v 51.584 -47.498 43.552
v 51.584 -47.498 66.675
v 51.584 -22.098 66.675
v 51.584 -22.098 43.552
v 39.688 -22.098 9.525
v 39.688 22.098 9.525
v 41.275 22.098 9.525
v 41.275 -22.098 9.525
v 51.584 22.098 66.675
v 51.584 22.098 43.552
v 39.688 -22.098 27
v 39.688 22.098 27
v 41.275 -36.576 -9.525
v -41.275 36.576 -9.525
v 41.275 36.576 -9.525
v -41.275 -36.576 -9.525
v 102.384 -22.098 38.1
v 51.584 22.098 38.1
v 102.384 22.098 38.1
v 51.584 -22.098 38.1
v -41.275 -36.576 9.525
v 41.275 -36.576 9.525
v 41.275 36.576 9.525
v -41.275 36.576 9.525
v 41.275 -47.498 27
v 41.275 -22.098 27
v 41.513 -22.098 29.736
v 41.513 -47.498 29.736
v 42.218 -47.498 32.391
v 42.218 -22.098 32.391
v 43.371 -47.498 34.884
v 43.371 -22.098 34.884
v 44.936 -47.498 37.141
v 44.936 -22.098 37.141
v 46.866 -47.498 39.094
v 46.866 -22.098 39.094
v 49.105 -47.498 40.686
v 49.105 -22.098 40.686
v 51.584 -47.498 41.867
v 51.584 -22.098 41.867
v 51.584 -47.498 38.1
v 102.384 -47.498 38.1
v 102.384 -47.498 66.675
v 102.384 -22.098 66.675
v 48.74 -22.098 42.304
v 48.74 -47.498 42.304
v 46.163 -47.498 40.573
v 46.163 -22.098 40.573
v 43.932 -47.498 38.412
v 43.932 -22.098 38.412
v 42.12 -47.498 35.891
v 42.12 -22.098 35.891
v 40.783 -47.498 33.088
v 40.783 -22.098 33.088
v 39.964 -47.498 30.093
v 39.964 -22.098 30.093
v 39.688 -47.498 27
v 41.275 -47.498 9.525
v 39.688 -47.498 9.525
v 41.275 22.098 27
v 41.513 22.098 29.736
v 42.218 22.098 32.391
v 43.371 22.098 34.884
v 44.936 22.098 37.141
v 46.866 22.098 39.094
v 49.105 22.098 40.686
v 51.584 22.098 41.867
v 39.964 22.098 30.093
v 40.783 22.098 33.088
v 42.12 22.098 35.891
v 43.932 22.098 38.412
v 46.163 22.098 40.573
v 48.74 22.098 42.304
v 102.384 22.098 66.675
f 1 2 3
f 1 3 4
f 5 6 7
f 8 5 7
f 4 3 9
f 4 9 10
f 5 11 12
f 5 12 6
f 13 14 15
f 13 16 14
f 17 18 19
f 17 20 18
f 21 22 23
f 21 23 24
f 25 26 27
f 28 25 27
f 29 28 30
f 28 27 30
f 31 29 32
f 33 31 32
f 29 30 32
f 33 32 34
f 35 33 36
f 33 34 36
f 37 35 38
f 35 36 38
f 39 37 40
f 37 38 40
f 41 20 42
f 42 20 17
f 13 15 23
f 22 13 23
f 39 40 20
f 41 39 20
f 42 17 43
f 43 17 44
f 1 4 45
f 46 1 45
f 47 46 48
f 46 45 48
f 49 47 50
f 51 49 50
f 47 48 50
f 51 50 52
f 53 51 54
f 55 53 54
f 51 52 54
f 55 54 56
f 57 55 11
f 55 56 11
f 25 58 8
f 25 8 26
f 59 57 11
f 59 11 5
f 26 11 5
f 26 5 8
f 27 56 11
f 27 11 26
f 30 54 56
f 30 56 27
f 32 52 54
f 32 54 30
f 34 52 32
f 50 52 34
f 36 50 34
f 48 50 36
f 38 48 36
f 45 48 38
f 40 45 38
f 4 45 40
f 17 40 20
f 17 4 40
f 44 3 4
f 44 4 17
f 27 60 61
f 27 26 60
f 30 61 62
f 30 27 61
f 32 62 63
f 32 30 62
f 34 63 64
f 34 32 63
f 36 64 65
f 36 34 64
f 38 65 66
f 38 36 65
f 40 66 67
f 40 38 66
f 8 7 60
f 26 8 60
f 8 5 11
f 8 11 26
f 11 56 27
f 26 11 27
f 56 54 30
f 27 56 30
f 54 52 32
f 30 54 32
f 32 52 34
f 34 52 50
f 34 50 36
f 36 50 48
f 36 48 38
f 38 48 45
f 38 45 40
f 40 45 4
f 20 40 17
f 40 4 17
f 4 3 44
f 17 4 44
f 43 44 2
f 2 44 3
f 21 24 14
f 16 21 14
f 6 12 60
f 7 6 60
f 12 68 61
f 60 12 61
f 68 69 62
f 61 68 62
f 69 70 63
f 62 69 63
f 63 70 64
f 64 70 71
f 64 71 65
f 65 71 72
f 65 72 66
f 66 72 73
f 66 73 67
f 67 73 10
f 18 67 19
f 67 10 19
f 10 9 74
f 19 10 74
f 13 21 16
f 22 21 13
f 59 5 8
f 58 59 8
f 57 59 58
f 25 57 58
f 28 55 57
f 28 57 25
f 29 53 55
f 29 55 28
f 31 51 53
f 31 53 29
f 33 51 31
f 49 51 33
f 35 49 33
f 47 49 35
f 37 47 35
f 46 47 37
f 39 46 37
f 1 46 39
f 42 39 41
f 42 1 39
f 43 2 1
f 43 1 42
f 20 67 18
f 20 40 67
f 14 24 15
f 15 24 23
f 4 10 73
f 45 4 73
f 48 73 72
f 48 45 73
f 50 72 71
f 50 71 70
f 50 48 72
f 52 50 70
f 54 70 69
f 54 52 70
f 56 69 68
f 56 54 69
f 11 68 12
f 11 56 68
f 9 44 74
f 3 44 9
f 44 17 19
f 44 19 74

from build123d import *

# Parameters (mm, degrees)
F1_DEPTH = 36.576
F2_DEPTH = 22.098
F3_DEPTH = 25.4


with BuildPart() as f1:
    # F0 (on Front) → F1 (new body, symmetric)
    with BuildSketch(Plane.XZ):
        Polygon((-41.275, -9.525), (41.275, -9.525), (41.275, 9.525), (39.6875, 9.525), (-41.275, 9.525), align=None)
    extrude(amount=F1_DEPTH, both=True)


with BuildPart() as f2:
    # F0 (on Front) → F2 (new body, symmetric)
    with BuildSketch(Plane.XZ):
        Polygon((51.58396, 43.55188), (51.58396, 41.86744), (51.58396, 38.1), (102.38396, 38.1), (102.38396, 66.675), (51.58396, 66.675), align=None)
        with BuildLine():
            Line((39.6875, 9.525), (41.275, 9.525))
            Line((41.275, 9.525), (41.275, 27.0002))
            ThreePointArc((41.275, 27.0002), (44.104378, 36.046048), (51.58396, 41.86744))
            Line((51.58396, 41.86744), (51.58396, 43.55188))
            ThreePointArc((51.58396, 43.55188), (42.970157, 37.191911), (39.6875, 27.0002))
            Line((39.6875, 27.0002), (39.6875, 9.525))
        make_face()
    extrude(amount=F2_DEPTH, both=True)


with BuildPart() as f3:
    # F2_face (on face) → F3 (new body)
    with BuildSketch(Plane(origin=(75.611873, -22.098, 51.409216), x_dir=(1, 0, 0), z_dir=(0, -1, 0))):
        with BuildLine():
            Line((-24.027913, -9.541776), (-24.027913, -13.309216))
            Line((-24.027913, -13.309216), (26.772087, -13.309216))
            Line((26.772087, -13.309216), (26.772087, 15.265784))
            Line((26.772087, 15.265784), (-24.027913, 15.265784))
            Line((-24.027913, 15.265784), (-24.027913, -7.857336))
            ThreePointArc((-24.027913, -7.857336), (-32.641715, -14.217305), (-35.924373, -24.409016))
            Line((-35.924373, -24.409016), (-35.924373, -41.884216))
            Line((-35.924373, -41.884216), (-34.336873, -41.884216))
            Line((-34.336873, -41.884216), (-34.336873, -24.409016))
            ThreePointArc((-34.336873, -24.409016), (-31.507495, -15.363168), (-24.027913, -9.541776))
        make_face()
    extrude(amount=F3_DEPTH)


solid = Compound([f1.part, f2.part, f3.part])
